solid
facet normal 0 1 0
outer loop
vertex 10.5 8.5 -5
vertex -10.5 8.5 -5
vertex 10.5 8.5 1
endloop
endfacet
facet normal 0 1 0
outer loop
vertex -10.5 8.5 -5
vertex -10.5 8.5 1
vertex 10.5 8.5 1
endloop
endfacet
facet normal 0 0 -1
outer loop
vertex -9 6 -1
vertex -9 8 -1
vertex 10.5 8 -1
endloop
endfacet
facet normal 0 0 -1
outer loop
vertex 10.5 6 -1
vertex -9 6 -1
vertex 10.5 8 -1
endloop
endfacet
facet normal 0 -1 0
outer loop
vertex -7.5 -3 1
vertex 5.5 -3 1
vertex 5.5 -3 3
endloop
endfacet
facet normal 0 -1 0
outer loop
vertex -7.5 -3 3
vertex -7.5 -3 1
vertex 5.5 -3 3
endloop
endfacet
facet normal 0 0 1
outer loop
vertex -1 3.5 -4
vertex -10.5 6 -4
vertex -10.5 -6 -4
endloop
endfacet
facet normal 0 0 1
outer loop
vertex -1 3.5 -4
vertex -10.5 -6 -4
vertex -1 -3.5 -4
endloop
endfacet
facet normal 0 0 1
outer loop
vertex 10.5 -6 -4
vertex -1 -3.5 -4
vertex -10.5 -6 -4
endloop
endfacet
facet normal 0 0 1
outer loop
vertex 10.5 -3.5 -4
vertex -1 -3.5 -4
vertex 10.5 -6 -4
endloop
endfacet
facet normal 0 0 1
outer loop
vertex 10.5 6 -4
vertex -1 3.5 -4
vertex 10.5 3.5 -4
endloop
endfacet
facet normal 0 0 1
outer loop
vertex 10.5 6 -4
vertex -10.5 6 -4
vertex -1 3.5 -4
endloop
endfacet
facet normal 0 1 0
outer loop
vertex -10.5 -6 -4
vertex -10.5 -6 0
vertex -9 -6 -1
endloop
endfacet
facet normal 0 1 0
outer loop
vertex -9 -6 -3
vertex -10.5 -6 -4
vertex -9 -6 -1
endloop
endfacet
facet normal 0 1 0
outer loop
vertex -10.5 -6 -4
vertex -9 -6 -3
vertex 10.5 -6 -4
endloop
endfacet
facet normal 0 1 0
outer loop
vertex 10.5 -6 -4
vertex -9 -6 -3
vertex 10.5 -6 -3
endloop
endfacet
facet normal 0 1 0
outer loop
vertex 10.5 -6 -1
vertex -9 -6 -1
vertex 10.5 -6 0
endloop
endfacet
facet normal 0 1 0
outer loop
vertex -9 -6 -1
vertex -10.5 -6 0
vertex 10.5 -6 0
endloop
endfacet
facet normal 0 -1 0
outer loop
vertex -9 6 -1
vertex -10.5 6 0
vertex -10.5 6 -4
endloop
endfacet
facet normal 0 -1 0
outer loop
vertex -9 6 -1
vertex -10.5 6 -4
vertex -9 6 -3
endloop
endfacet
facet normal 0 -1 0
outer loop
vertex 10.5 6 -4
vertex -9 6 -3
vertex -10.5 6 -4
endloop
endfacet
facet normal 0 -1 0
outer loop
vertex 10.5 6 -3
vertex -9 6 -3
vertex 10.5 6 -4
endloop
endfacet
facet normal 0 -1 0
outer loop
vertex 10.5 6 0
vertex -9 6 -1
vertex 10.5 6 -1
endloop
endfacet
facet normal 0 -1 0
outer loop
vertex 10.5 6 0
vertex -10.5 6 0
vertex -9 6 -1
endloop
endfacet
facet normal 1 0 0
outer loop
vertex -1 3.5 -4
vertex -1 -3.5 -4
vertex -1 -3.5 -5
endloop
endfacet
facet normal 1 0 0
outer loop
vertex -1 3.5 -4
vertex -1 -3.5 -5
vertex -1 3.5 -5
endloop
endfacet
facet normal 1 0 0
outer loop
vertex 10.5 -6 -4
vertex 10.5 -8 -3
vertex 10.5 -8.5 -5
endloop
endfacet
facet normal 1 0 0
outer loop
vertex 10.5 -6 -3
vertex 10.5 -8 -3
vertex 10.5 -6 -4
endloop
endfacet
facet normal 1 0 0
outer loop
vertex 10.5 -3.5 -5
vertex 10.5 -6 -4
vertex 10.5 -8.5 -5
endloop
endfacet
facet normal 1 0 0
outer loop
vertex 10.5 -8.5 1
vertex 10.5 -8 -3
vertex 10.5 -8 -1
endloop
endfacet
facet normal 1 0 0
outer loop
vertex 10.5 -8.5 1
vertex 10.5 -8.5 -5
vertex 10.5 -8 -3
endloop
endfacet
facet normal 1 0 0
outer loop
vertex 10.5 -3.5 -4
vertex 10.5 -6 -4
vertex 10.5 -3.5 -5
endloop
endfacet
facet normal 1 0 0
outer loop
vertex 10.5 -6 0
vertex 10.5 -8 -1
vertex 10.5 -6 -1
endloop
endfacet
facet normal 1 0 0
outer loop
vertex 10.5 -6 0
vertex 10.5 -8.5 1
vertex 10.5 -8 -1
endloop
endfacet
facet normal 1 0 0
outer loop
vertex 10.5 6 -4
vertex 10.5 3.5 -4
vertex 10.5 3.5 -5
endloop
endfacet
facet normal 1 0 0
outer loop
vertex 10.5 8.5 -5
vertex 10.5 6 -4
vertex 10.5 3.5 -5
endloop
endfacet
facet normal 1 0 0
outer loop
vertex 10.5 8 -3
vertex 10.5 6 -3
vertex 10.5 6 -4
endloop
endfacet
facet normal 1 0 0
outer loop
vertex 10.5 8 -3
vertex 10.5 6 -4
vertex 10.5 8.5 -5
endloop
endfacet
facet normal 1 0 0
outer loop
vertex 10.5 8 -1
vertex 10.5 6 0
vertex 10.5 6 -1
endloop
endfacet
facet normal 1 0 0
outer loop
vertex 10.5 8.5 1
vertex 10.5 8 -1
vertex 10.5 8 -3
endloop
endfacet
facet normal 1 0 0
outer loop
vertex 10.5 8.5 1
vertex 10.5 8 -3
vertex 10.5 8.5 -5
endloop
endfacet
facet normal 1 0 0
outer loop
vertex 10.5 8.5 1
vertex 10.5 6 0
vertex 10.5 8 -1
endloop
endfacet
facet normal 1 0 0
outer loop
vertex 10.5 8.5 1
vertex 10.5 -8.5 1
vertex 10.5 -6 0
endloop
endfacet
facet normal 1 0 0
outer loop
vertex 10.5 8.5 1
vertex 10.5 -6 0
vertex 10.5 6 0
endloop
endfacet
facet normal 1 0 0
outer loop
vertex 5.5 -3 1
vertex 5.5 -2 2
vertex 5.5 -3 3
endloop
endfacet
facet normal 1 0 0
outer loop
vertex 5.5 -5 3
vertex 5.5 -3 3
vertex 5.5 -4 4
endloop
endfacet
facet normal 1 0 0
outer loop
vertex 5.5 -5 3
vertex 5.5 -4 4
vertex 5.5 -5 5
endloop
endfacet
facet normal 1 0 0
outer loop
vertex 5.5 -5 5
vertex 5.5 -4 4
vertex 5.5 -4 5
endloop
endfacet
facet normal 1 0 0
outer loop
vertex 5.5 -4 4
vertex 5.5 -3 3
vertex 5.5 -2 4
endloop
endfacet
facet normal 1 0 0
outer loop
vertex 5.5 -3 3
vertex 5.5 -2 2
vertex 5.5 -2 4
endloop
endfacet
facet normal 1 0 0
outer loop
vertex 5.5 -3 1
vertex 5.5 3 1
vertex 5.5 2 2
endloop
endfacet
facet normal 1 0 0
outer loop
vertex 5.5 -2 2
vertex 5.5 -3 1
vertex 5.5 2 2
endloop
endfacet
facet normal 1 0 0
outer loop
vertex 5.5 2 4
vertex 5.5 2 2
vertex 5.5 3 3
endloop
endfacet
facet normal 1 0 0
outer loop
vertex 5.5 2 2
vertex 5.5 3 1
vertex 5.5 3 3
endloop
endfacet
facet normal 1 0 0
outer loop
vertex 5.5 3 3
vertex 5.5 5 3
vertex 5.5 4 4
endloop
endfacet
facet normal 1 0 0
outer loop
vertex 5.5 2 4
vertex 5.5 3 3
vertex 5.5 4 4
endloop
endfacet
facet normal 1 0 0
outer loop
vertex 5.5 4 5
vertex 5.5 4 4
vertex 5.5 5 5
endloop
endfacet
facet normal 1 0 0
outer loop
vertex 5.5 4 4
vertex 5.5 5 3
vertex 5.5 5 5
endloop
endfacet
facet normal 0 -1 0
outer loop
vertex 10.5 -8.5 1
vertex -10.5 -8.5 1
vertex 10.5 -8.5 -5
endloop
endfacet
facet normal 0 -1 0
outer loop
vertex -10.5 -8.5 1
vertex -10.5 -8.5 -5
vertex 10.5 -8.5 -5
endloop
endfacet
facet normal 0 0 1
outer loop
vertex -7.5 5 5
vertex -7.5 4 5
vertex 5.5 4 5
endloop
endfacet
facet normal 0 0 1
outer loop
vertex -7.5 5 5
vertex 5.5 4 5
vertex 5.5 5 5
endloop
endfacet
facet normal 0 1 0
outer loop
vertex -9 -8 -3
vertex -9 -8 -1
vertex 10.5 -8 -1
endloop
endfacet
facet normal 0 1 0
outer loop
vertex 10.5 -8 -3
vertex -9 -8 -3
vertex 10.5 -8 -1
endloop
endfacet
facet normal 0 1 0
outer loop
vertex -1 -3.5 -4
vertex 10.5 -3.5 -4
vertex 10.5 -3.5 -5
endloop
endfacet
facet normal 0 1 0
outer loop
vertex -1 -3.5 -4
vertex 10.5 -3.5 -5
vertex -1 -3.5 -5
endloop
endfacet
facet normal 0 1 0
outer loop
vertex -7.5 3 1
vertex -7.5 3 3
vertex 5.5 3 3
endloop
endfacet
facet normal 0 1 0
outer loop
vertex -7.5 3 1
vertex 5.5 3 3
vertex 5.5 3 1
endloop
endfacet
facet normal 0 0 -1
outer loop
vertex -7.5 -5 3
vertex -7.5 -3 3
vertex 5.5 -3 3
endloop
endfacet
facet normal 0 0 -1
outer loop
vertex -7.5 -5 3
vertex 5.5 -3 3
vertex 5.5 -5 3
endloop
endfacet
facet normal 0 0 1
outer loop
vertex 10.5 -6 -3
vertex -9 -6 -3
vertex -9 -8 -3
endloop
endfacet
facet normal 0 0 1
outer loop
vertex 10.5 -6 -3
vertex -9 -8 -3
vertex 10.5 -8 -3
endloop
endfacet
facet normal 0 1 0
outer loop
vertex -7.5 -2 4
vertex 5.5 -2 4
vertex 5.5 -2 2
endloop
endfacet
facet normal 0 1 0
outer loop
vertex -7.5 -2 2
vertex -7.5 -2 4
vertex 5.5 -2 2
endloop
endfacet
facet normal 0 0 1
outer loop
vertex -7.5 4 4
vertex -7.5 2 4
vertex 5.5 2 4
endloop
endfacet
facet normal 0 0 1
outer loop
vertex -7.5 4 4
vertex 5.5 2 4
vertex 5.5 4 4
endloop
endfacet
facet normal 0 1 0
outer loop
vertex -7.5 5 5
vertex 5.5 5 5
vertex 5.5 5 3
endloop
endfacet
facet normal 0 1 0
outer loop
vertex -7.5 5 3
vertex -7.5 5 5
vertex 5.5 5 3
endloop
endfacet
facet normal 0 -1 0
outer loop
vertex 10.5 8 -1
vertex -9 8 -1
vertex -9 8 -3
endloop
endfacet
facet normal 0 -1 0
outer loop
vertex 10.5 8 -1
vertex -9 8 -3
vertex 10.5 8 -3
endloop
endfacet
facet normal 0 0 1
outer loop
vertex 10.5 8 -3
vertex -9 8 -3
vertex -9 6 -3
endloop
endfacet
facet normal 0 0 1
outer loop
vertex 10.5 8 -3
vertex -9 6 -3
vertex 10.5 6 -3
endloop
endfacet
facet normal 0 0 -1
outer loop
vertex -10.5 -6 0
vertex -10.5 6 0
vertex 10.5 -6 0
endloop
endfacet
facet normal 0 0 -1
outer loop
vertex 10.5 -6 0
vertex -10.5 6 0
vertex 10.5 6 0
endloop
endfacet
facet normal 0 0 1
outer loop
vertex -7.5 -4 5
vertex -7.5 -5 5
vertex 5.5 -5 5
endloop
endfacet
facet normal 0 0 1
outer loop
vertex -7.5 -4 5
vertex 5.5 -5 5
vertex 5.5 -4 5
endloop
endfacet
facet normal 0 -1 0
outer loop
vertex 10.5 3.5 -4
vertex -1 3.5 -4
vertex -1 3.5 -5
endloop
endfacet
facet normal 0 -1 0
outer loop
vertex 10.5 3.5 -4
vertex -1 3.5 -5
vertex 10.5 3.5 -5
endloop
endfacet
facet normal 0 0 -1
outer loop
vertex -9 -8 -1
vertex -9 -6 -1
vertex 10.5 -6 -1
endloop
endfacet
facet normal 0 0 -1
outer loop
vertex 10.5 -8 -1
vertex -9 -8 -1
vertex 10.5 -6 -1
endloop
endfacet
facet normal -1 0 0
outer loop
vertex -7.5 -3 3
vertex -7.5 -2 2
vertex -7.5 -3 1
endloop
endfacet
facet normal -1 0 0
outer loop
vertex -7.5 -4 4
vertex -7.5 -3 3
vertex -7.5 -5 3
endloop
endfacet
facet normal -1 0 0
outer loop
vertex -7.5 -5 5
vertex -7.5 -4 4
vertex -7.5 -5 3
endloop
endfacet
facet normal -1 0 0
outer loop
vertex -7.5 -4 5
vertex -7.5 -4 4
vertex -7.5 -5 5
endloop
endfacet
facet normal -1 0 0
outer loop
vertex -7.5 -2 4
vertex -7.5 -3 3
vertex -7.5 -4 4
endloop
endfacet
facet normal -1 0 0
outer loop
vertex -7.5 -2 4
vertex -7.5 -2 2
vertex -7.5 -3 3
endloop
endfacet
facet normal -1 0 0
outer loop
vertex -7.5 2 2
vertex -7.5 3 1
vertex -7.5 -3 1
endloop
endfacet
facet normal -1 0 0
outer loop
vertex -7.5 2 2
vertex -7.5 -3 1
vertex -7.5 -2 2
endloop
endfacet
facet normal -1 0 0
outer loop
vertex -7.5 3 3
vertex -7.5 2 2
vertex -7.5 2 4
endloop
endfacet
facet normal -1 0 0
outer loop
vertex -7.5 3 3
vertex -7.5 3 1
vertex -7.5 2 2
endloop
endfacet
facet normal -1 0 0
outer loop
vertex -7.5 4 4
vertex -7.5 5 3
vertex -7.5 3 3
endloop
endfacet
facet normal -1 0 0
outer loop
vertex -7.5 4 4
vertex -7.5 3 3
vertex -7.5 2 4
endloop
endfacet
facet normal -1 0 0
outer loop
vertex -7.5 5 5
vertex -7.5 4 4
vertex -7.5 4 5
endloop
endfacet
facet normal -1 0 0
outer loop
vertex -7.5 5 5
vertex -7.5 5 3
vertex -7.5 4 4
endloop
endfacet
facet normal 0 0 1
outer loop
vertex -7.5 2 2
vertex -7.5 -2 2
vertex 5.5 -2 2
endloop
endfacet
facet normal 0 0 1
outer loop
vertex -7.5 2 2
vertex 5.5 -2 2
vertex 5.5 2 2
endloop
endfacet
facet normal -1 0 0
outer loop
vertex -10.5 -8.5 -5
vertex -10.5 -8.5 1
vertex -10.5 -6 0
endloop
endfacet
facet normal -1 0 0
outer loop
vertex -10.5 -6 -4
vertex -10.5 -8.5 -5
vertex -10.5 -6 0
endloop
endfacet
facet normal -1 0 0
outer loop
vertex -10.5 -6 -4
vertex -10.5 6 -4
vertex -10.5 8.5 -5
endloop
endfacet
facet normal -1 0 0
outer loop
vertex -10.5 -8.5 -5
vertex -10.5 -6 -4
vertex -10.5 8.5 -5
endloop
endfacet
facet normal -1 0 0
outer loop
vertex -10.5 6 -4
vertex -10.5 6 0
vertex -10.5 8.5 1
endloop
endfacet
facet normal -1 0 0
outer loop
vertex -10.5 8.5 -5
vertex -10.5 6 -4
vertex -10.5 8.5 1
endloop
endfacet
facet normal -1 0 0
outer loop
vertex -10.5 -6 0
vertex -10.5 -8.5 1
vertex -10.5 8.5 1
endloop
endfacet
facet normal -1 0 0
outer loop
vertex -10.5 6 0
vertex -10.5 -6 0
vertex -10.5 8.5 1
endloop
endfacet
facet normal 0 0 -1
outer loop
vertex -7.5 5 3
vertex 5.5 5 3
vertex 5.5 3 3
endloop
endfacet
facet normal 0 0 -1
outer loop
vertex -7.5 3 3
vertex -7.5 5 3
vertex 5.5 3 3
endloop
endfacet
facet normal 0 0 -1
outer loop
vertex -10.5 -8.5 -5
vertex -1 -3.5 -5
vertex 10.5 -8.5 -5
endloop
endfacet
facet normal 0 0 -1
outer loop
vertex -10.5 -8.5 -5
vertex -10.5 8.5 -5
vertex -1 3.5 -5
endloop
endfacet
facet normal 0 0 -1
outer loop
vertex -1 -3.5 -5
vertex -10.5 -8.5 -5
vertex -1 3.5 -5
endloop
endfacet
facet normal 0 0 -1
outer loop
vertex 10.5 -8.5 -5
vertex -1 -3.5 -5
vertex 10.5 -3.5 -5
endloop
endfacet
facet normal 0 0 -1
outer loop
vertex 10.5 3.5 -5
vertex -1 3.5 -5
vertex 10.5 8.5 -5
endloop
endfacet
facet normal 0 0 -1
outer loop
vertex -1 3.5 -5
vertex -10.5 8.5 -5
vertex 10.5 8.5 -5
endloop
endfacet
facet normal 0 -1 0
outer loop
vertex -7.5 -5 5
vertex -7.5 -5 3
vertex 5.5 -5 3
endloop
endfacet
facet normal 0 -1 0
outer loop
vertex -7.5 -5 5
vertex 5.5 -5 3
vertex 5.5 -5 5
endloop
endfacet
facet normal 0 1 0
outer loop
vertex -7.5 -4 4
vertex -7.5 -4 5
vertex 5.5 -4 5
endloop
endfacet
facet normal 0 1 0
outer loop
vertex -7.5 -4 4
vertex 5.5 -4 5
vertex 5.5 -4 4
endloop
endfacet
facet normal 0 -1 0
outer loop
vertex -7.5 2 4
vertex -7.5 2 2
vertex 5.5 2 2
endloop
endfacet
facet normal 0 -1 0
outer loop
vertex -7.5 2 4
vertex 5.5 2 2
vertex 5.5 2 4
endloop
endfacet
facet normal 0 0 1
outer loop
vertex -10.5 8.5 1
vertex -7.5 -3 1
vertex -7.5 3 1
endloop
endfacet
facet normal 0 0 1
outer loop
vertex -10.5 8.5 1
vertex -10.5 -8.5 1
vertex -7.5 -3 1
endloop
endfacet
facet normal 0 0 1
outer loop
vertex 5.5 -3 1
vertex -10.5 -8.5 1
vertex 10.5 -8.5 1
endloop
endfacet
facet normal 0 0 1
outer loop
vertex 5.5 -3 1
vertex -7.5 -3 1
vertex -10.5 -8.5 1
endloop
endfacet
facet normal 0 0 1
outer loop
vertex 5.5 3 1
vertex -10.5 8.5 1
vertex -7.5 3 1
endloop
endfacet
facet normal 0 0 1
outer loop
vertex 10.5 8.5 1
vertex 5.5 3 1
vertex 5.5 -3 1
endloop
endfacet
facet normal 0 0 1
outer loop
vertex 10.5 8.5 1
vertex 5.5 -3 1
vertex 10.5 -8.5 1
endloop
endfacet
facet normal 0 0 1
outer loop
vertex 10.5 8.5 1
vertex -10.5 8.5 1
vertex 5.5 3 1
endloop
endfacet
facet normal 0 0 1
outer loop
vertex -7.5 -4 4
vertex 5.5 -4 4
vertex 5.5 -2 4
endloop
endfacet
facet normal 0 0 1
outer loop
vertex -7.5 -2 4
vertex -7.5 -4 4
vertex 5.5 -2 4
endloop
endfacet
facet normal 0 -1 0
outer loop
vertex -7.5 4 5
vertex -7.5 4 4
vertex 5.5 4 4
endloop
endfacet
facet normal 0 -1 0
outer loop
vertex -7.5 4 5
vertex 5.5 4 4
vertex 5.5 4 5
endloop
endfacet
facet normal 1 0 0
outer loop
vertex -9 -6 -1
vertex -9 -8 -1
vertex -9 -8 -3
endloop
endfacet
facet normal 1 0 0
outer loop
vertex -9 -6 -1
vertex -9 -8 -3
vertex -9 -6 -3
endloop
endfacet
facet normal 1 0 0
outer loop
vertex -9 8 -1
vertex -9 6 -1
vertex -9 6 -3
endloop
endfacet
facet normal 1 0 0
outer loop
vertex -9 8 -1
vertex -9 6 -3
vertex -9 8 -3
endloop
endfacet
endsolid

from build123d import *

# Parameters (mm, degrees)
ESQUISSE1_W             = 21
ESQUISSE1_H             = 17
BOSS_EXTRU_1_DEPTH      = 1
BOSS_EXTRU_2_START      = -4
BOSS_EXTRU_2_DEPTH      = 1
ESQUISSE1_4_W           = 21
ESQUISSE1_4_H           = 2.5
BOSS_EXTRU_3_DEPTH      = 4
ENL_V_START             = -1
ESQUISSE1_6_W           = 19.5
ESQUISSE1_6_H           = 2
ENL_V_MAT_EXTRU_1_DEPTH = 2
BOSS_EXTRU_4_START      = -3
BOSS_EXTRU_4_DEPTH      = 13


with BuildPart() as part:
    # Esquisse1 → Boss.-Extru.1 (new body)
    with BuildSketch(Plane.XY):
        Rectangle(ESQUISSE1_W, ESQUISSE1_H)
    extrude(amount=BOSS_EXTRU_1_DEPTH)



with BuildPart() as body_2:
    # Esquisse1_3 → Boss.-Extru.2 (new body)
    with BuildSketch(Plane.XY.offset(BOSS_EXTRU_2_START)):
        Polygon((-10.5, 8.5), (-10.5, -8.5), (10.5, -8.5), (10.5, -3.5), (-1, -3.5), (-1, 3.5), (10.5, 3.5), (10.5, 8.5), align=None)
    extrude(amount=-BOSS_EXTRU_2_DEPTH)


with BuildPart() as part_1:
    add(part.part)

    add(body_2.part)  # Boss.-Extru.3 merges body 2
    # Esquisse1_4 → Boss.-Extru.3 (add)
    with BuildSketch(Plane.XY):
        with Locations((0, 7.25)):
            Rectangle(ESQUISSE1_4_W, ESQUISSE1_4_H)
        with Locations((0, -7.25)):
            Rectangle(ESQUISSE1_4_W, ESQUISSE1_4_H)
    extrude(amount=-BOSS_EXTRU_3_DEPTH)

    # Esquisse1_6 → Enl_v. mat.-Extru.1 (cut)
    with BuildSketch(Plane.XY.offset(ENL_V_START)):
        with Locations((0.75, -7)):
            Rectangle(ESQUISSE1_6_W, ESQUISSE1_6_H)
        with Locations((0.75, 7)):
            Rectangle(ESQUISSE1_6_W, ESQUISSE1_6_H)
    extrude(amount=-ENL_V_MAT_EXTRU_1_DEPTH, mode=Mode.SUBTRACT)

    # Esquisse2 → Boss.-Extru.4 (add)
    with BuildSketch(Plane.ZY.offset(10.5).offset(BOSS_EXTRU_4_START)):
        Polygon((3, 3), (1, 3), (1, -3), (3, -3), (3, -5), (5, -5), (5, -4), (4, -4), (4, -2), (2, -2), (2, 2), (4, 2), (4, 4), (5, 4), (5, 5), (3, 5), align=None)
    extrude(amount=-BOSS_EXTRU_4_DEPTH)


solid = part_1.part
